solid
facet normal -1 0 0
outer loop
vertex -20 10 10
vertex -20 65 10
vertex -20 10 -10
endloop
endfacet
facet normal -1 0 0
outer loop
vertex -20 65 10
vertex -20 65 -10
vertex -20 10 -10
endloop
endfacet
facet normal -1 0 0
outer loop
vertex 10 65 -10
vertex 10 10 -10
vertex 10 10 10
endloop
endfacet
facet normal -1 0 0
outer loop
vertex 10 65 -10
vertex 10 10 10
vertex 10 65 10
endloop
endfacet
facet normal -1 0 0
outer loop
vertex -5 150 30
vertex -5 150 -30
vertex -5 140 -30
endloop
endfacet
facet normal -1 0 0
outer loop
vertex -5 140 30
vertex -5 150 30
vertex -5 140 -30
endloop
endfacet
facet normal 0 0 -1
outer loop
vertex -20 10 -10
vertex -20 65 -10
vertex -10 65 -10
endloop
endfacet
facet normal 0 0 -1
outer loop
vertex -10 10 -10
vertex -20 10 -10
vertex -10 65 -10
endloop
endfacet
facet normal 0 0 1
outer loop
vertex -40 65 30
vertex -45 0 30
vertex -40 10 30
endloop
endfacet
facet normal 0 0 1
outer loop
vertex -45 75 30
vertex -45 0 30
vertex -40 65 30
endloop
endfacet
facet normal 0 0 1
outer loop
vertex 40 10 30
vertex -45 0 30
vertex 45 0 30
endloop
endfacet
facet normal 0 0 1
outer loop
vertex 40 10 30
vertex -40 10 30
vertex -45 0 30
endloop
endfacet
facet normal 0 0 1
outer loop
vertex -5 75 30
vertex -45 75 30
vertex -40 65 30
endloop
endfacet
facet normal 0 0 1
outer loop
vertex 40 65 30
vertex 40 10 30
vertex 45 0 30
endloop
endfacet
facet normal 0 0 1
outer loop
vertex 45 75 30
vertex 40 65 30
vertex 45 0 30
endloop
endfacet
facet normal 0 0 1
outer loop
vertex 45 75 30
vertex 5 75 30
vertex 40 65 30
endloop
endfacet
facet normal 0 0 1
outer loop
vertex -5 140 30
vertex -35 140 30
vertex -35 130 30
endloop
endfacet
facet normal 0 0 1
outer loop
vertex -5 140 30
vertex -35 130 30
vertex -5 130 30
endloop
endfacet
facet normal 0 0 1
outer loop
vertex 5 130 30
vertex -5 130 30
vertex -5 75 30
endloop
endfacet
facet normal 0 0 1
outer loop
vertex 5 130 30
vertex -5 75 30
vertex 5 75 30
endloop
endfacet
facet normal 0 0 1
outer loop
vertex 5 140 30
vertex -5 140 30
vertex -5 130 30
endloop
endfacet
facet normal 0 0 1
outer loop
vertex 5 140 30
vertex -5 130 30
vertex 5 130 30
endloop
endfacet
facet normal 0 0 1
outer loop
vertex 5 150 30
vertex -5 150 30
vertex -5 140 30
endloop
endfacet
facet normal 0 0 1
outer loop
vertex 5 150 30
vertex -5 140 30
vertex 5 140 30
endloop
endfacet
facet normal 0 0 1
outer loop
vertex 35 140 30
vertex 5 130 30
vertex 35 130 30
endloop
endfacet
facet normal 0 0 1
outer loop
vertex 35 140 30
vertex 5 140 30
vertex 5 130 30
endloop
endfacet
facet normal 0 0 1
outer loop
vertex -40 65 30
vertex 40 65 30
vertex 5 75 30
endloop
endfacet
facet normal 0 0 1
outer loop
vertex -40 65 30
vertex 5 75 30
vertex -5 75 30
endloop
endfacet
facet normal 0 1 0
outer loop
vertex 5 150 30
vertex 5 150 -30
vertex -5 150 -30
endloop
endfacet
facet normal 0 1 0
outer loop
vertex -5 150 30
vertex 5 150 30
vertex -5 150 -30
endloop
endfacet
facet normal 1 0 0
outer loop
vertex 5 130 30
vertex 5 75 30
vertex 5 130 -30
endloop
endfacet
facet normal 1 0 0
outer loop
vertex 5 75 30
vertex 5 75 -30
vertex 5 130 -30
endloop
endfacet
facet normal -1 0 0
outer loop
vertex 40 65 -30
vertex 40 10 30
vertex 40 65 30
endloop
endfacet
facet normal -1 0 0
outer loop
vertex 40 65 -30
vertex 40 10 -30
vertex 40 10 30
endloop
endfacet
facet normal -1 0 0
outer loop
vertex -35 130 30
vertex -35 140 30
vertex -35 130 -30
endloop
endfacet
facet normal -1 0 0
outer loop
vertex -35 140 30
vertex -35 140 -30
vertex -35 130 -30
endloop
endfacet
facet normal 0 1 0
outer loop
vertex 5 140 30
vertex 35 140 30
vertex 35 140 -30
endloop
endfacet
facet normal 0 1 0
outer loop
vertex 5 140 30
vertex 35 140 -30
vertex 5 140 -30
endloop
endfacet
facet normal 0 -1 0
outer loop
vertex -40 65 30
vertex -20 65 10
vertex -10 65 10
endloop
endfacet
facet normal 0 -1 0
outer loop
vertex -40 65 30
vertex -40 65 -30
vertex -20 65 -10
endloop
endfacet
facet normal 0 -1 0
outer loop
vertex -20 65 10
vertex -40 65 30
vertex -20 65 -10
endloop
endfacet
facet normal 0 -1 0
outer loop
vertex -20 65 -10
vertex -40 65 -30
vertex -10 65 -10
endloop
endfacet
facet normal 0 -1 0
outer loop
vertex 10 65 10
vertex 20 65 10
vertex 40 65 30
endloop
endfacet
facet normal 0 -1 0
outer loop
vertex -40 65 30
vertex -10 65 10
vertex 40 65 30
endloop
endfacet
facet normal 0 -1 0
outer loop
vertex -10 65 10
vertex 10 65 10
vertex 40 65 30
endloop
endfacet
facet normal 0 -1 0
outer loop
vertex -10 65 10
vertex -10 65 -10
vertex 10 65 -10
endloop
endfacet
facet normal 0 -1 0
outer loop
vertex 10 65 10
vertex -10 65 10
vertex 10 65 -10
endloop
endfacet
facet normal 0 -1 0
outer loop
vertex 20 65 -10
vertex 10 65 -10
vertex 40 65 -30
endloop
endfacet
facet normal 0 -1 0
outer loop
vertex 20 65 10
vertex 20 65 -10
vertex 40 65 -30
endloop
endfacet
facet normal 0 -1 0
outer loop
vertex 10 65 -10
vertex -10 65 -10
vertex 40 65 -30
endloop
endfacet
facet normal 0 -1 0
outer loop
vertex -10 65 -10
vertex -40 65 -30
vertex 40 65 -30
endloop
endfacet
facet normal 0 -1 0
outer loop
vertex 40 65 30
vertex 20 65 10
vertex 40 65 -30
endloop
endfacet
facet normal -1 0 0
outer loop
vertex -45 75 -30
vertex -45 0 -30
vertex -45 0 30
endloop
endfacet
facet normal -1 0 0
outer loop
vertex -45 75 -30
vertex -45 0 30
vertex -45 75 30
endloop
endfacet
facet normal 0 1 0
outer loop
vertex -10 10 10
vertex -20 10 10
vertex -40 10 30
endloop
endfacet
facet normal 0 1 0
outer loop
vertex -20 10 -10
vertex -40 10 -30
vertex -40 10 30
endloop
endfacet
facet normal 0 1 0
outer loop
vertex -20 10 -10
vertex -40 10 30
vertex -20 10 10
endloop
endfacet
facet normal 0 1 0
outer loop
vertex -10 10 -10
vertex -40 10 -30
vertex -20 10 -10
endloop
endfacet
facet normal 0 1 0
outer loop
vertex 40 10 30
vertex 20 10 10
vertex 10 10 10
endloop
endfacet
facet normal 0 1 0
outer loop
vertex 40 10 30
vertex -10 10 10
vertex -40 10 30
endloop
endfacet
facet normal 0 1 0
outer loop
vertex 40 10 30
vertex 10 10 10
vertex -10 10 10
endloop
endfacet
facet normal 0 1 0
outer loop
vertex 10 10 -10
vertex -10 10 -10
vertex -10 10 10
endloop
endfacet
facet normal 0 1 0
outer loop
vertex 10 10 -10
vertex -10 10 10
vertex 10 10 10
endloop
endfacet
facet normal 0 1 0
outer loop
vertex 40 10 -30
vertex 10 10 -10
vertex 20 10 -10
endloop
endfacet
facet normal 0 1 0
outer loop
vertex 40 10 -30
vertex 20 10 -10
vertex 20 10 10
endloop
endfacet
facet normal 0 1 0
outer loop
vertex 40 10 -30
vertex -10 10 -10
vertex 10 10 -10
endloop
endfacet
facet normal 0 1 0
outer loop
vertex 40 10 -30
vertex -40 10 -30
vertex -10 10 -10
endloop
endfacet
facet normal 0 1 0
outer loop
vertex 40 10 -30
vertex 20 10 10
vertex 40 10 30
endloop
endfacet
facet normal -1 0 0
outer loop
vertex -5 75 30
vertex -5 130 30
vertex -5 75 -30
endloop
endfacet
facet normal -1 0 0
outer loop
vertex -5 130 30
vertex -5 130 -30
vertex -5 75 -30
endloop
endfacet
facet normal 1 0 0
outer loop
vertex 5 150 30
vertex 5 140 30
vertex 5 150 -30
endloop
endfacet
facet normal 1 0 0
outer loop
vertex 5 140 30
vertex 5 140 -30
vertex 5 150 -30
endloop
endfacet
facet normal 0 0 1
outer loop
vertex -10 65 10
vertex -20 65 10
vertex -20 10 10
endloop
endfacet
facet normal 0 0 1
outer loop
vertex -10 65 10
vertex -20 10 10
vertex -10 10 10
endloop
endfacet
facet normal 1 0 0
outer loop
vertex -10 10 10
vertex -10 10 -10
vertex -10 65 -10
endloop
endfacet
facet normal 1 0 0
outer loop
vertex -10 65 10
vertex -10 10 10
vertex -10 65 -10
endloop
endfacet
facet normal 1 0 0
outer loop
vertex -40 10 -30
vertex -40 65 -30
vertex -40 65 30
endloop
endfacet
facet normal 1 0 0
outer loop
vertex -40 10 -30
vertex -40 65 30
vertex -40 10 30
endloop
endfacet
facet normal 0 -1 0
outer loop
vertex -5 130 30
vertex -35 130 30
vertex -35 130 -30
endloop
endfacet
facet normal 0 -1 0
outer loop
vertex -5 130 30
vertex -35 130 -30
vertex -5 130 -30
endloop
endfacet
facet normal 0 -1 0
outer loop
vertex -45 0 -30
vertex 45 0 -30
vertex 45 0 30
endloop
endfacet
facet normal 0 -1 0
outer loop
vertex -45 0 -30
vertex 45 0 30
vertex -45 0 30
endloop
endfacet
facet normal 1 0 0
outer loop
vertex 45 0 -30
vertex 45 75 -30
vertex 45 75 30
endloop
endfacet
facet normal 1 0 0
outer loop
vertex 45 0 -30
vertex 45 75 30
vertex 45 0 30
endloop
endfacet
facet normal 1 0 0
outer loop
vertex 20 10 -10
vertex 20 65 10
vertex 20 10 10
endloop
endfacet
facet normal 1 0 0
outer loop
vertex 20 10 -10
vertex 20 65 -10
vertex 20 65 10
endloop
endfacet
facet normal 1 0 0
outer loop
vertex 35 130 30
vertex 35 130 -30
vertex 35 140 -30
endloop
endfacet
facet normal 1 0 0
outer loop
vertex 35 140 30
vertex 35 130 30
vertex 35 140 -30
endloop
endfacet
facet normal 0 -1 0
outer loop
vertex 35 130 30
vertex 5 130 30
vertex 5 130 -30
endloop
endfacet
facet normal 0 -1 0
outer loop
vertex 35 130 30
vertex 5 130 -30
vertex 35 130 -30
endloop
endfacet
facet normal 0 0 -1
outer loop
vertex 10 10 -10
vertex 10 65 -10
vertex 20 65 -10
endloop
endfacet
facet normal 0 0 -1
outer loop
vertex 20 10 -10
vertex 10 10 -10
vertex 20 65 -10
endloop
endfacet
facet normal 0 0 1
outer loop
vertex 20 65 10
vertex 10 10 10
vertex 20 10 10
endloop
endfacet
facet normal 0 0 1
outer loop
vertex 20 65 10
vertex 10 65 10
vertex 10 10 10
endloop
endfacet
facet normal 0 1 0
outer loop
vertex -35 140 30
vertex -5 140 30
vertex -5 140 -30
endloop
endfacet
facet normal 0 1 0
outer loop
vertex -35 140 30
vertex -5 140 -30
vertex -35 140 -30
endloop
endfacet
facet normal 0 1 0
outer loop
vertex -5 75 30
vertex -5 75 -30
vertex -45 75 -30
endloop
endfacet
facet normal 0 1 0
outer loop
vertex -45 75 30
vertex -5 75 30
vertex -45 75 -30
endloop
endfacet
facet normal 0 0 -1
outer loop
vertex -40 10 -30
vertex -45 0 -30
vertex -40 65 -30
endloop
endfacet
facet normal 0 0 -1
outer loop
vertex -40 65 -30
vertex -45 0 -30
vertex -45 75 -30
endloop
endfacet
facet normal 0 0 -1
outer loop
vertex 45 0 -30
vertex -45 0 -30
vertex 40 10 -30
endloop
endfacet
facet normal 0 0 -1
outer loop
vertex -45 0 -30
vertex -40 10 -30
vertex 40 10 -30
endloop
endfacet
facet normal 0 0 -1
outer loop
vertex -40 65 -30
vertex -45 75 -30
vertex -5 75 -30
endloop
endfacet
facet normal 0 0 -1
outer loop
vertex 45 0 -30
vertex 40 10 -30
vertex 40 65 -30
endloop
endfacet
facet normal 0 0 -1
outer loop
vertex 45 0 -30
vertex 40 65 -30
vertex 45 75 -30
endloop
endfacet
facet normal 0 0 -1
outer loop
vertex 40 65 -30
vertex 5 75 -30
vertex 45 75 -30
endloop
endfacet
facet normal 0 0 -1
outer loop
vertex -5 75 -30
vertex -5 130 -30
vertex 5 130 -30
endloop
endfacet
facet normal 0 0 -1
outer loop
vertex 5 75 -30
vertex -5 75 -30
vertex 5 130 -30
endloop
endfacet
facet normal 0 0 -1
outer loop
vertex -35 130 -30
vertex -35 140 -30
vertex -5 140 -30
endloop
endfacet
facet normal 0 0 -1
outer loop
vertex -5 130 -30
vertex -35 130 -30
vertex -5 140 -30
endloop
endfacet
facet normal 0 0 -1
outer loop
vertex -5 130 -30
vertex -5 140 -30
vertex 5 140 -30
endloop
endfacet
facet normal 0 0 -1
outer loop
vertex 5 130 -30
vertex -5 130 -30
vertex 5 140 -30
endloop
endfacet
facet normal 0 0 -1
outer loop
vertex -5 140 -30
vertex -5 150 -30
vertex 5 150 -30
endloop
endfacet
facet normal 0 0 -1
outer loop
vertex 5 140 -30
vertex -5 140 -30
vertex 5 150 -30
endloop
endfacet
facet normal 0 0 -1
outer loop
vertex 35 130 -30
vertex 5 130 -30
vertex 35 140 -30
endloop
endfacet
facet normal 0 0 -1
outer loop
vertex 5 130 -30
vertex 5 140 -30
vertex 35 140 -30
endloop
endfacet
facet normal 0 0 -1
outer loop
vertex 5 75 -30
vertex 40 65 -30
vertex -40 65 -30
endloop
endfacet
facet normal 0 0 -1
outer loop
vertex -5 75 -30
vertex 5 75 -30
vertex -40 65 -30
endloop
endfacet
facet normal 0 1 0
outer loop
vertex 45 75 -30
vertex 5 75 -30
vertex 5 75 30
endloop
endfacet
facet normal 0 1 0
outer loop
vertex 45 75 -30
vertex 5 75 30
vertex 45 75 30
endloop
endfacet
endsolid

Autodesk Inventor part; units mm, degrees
ref_plane "YZ Plane" through (0, 0, 0) normal (1, 0, 0) x (0, 1, 0)
ref_plane "XZ Plane" through (0, 0, 0) normal (0, 1, 0) x (-1, 0, 0)
ref_plane "XY Plane" through (0, 0, 0) normal (0, 0, 1) x (1, 0, 0)
sketch "스케치1" plane through (0, 0, 0) normal (0, 0, 1) x (1, 0, 0)
  line L0 (0, 0) -> (0, 150)
  line L1 (45, 0) -> (-45, 0)
  line L2 (-45, 0) -> (-45, 10)
  line L3 (-45, 10) -> (45, 10)
  line L4 (45, 10) -> (45, 0)
  line L5 (45, 0) -> (-45, 10) construction
  line L6 (-45, 0) -> (45, 10) construction
  line L7 (-35, 130) -> (35, 130)
  line L8 (35, 130) -> (35, 140)
  line L9 (35, 140) -> (-35, 140)
  line L10 (-35, 140) -> (-35, 130)
  line L11 (-35, 130) -> (35, 140) construction
  line L12 (35, 130) -> (-35, 140) construction
  line L13 (-40, 65) -> (40, 65)
  line L14 (40, 65) -> (40, 75)
  line L15 (40, 75) -> (-40, 75)
  line L16 (-40, 75) -> (-40, 65)
  line L17 (-40, 65) -> (40, 75) construction
  line L18 (40, 65) -> (-40, 75) construction
  line L19 (5, 150) -> (-5, 150)
  line L20 (-5, 0) -> (5, 0)
  line L21 (-45, 10) -> (-40, 10)
  line L22 (-40, 10) -> (-40, 75)
  line L23 (-40, 75) -> (-45, 75)
  line L24 (-45, 75) -> (-45, 10)
  line L25 (45, 10) -> (40, 10)
  line L26 (40, 10) -> (40, 75)
  line L27 (40, 75) -> (45, 75)
  line L28 (45, 75) -> (45, 10)
  line L29 (5, 0) -> (5, 10)
  line L30 (5, 65) -> (5, 150)
  line L31 (-5, 150) -> (-5, 65)
  line L32 (-5, 10) -> (-5, 0)
  line L33 (0, 10) -> (10, 10)
  line L34 (10, 10) -> (10, 65)
  line L35 (10, 65) -> (0, 65)
  line L36 (0, 65) -> (0, 10)
  line L37 (0, 10) -> (-10, 10)
  line L38 (-10, 10) -> (-10, 65)
  line L39 (-10, 65) -> (0, 65)
  line L40 (0, 65) -> (0, 10)
  line L41 (-10, 65) -> (-20, 65)
  line L42 (-20, 65) -> (-20, 10)
  line L43 (-20, 10) -> (-10, 10)
  line L44 (-10, 10) -> (-10, 65)
  line L45 (10, 65) -> (20, 65)
  line L46 (20, 65) -> (20, 10)
  line L47 (20, 10) -> (10, 10)
  line L48 (10, 10) -> (10, 65)
  point P0 (0, 5)
  point P1 (0, 135)
  point P2 (0, 70)
  point P3 (-5, 140)
  point P4 (5, 140)
  point P5 (-5, 75)
  point P6 (5, 75)
  point P7 (-5, 130)
  point P8 (5, 130)
  dimension "d16" = 150
  dimension "d17" = 90
  dimension "d18" = 10
  dimension "d22" = 70
  dimension "d23" = 10
  dimension "d25" = 80
  dimension "d26" = 10
  dimension "d27" = 55
  dimension "d28" = 55
  dimension "d29" = 10
  dimension "d30" = 150
  dimension "d35" = 10
  dimension "d36" = 10
  dimension "d37" = 10
  dimension "d38" = 10
extrude "돌출1" add sketch "스케치1" along normal blind 30 and the other way blind 30 contours L1 L32 L3 L0 | L0 L3 L29 L1 | L29 L3 L4 L1 | L1 L2 L3 L32 | L13 L31 L15 L0 | L0 L15 L30 L13 | L15 L31 L7 L0 | L0 L7 L30 L15 | L13 L16 L15 L31 | L30 L15 L14 L13 | L7 L31 L9 L0 | L0 L9 L30 L7 | L9 L31 L19 L0 | L0 L19 L30 L9 | L7 L10 L9 L31 | L30 L9 L8 L7
extrude "돌출2" add sketch "스케치1" along normal blind 30 and the other way blind 30 contours L3 L26 L14 L27 L28 | L24 L23 L16 L22 L3
extrude "돌출3" add sketch "스케치1" along normal blind 10 and the other way blind 10 contours L3 L42 L13 L38 | L34 L13 L46 L3
properties part number "팔"
